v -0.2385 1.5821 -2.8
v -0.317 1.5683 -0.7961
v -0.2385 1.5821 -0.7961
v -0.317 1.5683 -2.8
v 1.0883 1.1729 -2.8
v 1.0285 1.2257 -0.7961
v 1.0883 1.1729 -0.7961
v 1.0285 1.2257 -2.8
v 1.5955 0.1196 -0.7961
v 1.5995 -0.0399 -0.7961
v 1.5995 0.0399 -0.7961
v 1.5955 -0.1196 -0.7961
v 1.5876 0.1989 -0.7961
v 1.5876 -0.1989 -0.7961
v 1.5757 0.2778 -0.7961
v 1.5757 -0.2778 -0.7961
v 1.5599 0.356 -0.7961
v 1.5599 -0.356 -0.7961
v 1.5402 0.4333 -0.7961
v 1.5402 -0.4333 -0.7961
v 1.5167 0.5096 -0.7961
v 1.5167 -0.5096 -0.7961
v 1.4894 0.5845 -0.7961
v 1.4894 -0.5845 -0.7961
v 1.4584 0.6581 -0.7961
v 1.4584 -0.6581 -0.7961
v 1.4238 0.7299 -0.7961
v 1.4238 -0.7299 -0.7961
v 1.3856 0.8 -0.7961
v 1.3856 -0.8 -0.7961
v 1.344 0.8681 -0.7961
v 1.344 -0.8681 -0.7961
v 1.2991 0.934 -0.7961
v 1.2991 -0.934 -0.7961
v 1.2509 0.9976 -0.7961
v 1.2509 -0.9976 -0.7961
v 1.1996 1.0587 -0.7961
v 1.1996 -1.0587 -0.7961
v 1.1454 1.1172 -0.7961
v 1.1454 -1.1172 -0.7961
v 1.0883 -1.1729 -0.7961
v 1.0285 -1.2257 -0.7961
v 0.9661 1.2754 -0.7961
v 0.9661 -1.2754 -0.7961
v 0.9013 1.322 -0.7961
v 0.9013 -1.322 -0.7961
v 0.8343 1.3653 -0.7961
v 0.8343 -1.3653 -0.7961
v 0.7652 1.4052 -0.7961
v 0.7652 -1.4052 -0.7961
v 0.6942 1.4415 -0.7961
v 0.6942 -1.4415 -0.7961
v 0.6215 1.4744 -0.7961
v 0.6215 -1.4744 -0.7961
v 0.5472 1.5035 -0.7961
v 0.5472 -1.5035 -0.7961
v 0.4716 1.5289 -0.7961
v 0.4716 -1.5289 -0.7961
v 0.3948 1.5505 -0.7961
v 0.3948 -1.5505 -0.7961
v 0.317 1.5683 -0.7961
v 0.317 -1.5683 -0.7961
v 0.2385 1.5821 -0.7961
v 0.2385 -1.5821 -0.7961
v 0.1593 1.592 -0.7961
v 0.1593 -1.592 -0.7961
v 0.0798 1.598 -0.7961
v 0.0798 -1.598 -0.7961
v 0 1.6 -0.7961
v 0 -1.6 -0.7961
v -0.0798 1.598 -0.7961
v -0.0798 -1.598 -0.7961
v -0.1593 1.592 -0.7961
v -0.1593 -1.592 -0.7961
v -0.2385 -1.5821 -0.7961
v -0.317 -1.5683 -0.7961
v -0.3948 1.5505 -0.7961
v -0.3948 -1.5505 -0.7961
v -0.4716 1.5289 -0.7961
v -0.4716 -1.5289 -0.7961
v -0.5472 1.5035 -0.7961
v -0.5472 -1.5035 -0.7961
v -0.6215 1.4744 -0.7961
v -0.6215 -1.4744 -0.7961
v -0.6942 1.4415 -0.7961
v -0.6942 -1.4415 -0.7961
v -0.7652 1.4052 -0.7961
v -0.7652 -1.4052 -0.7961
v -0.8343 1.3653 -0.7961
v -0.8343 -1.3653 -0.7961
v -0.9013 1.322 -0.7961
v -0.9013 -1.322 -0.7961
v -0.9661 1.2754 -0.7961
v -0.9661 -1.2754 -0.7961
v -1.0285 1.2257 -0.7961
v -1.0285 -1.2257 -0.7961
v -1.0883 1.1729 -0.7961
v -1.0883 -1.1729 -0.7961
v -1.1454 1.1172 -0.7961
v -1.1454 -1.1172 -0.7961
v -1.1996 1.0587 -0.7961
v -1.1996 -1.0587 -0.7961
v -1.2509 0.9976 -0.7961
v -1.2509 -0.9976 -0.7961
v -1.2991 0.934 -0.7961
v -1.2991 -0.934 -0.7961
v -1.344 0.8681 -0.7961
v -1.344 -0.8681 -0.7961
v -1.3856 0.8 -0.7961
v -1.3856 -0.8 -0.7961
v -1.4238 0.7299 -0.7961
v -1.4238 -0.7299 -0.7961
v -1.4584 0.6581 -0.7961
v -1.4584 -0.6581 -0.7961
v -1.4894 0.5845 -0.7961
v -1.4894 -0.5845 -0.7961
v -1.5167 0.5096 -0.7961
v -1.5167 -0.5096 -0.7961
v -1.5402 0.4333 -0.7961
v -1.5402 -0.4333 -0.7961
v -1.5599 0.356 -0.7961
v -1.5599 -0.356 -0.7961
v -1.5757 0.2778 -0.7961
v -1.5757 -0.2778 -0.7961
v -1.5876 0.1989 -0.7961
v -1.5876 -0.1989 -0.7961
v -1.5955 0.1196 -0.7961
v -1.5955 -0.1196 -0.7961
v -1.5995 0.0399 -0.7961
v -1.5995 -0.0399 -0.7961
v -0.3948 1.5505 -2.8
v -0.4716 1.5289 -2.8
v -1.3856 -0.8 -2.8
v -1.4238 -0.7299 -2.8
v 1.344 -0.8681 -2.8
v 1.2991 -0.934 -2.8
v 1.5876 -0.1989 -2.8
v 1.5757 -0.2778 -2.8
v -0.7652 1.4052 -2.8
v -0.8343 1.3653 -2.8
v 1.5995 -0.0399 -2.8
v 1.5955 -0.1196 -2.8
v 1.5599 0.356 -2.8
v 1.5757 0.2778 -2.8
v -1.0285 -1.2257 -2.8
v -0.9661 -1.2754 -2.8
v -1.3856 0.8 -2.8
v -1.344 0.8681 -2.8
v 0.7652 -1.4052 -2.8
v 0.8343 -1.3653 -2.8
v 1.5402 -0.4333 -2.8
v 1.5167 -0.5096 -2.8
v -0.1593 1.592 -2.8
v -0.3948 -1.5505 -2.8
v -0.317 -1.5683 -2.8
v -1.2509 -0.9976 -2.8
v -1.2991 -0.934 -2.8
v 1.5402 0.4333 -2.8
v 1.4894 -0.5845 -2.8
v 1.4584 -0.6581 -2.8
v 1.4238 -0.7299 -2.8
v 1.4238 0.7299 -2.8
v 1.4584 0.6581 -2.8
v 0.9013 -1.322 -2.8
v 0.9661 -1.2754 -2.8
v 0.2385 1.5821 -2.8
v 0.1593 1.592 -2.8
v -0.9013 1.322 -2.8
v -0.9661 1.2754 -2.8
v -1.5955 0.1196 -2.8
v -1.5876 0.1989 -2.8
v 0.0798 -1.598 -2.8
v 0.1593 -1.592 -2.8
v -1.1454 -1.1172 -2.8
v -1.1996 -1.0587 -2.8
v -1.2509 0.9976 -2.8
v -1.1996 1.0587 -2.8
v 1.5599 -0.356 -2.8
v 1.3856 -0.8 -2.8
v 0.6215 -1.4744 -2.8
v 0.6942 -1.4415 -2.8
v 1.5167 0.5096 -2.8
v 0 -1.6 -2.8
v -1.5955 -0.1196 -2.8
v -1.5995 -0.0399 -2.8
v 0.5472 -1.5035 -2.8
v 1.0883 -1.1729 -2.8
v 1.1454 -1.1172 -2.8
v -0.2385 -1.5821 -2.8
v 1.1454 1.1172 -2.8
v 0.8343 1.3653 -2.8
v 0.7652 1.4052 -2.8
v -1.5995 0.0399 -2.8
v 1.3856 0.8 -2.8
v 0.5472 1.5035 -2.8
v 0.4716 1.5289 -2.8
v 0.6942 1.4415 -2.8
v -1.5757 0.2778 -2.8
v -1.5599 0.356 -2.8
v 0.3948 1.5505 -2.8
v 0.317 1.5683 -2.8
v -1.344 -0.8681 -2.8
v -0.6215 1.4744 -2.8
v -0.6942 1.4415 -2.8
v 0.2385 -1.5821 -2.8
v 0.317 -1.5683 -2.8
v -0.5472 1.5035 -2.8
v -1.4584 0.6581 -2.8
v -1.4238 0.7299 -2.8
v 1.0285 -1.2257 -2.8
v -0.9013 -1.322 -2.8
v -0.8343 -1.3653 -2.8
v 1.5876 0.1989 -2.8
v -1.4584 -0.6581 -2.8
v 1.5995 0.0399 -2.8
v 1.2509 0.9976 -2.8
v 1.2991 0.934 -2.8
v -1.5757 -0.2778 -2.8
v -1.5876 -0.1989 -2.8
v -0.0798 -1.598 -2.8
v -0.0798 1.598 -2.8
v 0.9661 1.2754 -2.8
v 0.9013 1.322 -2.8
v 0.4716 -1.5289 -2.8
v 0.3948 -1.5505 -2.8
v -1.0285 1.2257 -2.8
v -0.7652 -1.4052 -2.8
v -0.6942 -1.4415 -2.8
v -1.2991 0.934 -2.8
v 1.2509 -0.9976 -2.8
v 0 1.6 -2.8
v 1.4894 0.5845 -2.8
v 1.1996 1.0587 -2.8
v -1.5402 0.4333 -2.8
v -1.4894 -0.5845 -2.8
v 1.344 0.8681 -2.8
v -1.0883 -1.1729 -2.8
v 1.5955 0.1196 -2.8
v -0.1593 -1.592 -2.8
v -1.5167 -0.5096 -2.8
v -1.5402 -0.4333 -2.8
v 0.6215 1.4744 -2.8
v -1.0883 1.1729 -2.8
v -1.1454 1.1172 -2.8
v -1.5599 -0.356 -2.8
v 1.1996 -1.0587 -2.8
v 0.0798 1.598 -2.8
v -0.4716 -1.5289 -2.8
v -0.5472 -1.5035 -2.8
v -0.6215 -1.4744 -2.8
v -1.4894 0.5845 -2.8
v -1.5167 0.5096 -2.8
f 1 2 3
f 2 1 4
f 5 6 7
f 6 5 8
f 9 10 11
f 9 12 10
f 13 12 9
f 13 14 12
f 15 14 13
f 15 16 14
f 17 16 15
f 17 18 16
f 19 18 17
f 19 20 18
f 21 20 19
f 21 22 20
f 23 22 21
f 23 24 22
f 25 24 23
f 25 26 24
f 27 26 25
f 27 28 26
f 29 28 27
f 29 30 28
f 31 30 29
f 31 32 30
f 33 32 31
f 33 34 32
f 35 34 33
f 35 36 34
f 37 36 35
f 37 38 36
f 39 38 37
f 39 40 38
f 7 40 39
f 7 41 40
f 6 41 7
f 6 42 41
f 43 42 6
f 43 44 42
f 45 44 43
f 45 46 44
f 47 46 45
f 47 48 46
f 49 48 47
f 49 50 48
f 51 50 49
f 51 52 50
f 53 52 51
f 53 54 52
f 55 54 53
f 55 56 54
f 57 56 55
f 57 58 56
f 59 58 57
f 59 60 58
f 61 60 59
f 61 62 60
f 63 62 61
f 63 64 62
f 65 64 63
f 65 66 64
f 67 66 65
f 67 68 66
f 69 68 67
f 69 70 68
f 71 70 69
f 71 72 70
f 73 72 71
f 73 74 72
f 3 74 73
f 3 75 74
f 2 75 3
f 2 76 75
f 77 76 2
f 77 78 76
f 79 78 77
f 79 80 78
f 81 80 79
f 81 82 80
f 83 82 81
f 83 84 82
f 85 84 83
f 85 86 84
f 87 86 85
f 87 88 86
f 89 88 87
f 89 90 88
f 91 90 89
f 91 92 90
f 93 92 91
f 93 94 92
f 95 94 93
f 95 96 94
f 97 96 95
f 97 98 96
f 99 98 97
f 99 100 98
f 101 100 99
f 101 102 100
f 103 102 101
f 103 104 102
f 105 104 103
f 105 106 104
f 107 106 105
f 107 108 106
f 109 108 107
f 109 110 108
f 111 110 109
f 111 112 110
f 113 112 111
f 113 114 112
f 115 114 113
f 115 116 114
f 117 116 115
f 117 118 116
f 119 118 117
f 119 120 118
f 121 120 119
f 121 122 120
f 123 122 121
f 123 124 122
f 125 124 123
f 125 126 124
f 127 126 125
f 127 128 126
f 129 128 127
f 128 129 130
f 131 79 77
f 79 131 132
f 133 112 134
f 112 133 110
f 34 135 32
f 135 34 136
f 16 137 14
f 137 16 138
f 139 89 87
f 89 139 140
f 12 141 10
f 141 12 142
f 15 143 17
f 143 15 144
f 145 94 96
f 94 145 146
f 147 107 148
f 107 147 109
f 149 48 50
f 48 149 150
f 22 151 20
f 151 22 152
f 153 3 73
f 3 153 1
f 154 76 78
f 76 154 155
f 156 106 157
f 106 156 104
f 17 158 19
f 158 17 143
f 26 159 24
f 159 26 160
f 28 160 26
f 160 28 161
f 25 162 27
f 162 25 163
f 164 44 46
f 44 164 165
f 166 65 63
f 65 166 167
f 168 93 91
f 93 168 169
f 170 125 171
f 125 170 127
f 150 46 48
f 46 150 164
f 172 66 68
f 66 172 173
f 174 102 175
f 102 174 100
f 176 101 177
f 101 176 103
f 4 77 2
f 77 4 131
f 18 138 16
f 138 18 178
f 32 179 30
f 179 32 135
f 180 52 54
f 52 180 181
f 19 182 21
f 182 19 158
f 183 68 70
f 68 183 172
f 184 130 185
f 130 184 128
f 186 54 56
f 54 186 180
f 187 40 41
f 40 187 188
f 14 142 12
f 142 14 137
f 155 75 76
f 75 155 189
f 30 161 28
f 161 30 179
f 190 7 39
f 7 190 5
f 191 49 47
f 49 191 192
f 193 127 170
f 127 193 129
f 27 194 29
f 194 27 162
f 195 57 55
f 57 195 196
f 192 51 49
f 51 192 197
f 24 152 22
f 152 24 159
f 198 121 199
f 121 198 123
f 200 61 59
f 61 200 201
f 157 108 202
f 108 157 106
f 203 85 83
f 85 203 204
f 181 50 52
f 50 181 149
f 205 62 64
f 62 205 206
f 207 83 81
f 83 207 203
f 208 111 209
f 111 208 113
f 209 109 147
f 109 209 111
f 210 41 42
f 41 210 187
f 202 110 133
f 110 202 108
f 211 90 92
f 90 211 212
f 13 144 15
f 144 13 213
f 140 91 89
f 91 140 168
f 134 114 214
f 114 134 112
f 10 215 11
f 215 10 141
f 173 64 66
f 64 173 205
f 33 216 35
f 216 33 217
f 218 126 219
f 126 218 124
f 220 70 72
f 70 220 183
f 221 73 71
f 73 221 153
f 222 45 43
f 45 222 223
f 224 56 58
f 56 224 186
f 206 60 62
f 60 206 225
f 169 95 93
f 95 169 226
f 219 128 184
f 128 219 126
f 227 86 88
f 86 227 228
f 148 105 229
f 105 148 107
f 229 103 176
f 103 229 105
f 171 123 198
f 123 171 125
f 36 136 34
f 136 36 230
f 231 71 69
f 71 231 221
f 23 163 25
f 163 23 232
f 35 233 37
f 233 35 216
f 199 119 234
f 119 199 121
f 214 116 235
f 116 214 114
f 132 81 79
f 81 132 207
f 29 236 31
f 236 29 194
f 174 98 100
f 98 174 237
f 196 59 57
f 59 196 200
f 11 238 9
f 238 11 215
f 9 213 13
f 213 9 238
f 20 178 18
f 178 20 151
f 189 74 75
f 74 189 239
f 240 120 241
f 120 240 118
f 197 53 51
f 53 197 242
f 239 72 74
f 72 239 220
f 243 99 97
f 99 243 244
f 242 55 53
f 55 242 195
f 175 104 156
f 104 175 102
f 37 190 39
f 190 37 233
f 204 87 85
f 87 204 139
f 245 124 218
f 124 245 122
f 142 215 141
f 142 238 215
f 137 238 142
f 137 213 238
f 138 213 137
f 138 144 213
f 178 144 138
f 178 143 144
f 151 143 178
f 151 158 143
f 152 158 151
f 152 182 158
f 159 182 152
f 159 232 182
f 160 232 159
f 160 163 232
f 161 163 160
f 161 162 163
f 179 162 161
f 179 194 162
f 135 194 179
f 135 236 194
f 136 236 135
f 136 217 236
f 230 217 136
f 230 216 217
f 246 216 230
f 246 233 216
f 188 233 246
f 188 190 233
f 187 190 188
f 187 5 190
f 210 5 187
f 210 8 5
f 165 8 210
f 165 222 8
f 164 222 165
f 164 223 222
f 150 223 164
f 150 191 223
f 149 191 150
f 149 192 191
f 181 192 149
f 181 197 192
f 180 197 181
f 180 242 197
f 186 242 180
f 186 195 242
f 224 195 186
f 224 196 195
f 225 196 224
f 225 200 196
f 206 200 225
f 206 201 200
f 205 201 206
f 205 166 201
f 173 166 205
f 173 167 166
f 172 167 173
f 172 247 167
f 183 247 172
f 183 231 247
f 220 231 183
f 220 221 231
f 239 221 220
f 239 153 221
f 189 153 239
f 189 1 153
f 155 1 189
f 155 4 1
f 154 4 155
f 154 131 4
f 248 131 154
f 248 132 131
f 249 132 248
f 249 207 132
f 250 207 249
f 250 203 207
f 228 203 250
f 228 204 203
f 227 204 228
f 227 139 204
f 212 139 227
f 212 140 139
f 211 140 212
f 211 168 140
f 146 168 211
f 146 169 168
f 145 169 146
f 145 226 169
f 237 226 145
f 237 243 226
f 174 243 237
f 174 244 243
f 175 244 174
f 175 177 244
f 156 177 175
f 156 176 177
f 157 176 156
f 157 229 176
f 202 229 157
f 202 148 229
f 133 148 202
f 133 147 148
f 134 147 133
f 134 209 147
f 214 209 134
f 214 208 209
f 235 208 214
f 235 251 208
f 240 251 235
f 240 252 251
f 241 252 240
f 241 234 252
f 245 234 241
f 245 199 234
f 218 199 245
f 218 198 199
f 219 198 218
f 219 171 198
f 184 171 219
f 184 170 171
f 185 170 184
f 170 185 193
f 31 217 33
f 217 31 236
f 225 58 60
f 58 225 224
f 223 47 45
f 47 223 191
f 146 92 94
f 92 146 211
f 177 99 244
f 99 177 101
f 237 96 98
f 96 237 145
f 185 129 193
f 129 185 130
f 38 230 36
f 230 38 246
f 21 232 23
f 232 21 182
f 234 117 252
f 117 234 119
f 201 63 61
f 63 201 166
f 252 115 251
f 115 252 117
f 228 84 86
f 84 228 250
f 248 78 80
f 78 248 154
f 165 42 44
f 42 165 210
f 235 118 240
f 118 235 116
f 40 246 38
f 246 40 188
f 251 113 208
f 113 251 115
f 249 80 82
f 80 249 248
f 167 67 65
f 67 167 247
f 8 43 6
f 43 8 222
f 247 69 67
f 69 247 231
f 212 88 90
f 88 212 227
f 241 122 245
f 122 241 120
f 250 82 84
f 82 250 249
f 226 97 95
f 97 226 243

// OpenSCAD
use <../../lib.scad>
use <../../p/4-4cyli.scad>
use <../../p/4-4disc.scad>
use <../../p/7-8edge.scad>
use <3350as02.scad>
$fa=1; $fs=0.2;
function ldraw_lib__s__u9006s01(realsolid=false) = [
// 0 ~Roadsign Round Large without Front Face
// 0 Name: s\u9006s01.dat
// 0 Author: J.C. Tchang [tchang]
// 0 !LDRAW_ORG Subpart UPDATE 2010-02
// 0 !LICENSE Licensed under CC BY 2.0 and CC BY 4.0 : see CAreadme.txt
// 
// 0 BFC CERTIFY CCW
  [0,"BFC","CERTIFY"],
  [0,"BFC","CCW"],
// 
// 0 !HISTORY 2010-07-05 [PTadmin] Official Update 2010-02
// 
// 
// 1 16 0 0 0 1 0 0 0 1 0 0 0 1 s\3350as02.dat
  [1,16,0,0,0,1,0,0,0,1,0,0,0,1, ldraw_lib__s__3350as02(realsolid)],
// 0
// 1 16 0 -94 2 9.9498 0 24.0209 24.0209 0 -9.9498 0 -1 0 7-8edge.dat
  [1,16,0,-94,2,9.9498,0,24.0209,24.0209,0,-9.9498,0,-1,0, ldraw_lib__7_8edge(realsolid)],
// 1 16 0 -94 -2 9.9498 0 24.0209 24.0209 0 -9.9498 0 -1 0 7-8edge.dat
  [1,16,0,-94,-2,9.9498,0,24.0209,24.0209,0,-9.9498,0,-1,0, ldraw_lib__7_8edge(realsolid)],
// 1 16 0 -94 2 -26 0 0 0 0 26 0 -1 0 4-4disc.dat
  [1,16,0,-94,2,-26,0,0,0,0,26,0,-1,0, ldraw_lib__4_4disc(realsolid)],
// 1 16 0 -94 -2 26 0 0 0 0 26 0 4 0 4-4cyli.dat
  [1,16,0,-94,-2,26,0,0,0,0,26,0,4,0, ldraw_lib__4_4cyli(realsolid)],
// 2 24 9.95 -69.979 2 5.235 -69.048 2
  [2,24,9.95,-69.979,2,5.235,-69.048,2],
// 2 24 -9.95 -69.979 2 -5.235 -69.048 2
  [2,24,-9.95,-69.979,2,-5.235,-69.048,2],
// 2 24 9.95 -69.979 -2 5.235 -69.048 -2
  [2,24,9.95,-69.979,-2,5.235,-69.048,-2],
// 2 24 -9.95 -69.979 -2 -5.235 -69.048 -2
  [2,24,-9.95,-69.979,-2,-5.235,-69.048,-2],
// 0
];
module ldraw_lib__s__u9006s01(step=0, col=false, unit=2/5, alt=false, line=0.2, solid=!$preview)
    makepoly(ldraw_lib__s__u9006s01(solid), step=step, col=col, unit=unit, alt=alt, line=line, solid=solid);
ldraw_lib__s__u9006s01(line=0.2);
